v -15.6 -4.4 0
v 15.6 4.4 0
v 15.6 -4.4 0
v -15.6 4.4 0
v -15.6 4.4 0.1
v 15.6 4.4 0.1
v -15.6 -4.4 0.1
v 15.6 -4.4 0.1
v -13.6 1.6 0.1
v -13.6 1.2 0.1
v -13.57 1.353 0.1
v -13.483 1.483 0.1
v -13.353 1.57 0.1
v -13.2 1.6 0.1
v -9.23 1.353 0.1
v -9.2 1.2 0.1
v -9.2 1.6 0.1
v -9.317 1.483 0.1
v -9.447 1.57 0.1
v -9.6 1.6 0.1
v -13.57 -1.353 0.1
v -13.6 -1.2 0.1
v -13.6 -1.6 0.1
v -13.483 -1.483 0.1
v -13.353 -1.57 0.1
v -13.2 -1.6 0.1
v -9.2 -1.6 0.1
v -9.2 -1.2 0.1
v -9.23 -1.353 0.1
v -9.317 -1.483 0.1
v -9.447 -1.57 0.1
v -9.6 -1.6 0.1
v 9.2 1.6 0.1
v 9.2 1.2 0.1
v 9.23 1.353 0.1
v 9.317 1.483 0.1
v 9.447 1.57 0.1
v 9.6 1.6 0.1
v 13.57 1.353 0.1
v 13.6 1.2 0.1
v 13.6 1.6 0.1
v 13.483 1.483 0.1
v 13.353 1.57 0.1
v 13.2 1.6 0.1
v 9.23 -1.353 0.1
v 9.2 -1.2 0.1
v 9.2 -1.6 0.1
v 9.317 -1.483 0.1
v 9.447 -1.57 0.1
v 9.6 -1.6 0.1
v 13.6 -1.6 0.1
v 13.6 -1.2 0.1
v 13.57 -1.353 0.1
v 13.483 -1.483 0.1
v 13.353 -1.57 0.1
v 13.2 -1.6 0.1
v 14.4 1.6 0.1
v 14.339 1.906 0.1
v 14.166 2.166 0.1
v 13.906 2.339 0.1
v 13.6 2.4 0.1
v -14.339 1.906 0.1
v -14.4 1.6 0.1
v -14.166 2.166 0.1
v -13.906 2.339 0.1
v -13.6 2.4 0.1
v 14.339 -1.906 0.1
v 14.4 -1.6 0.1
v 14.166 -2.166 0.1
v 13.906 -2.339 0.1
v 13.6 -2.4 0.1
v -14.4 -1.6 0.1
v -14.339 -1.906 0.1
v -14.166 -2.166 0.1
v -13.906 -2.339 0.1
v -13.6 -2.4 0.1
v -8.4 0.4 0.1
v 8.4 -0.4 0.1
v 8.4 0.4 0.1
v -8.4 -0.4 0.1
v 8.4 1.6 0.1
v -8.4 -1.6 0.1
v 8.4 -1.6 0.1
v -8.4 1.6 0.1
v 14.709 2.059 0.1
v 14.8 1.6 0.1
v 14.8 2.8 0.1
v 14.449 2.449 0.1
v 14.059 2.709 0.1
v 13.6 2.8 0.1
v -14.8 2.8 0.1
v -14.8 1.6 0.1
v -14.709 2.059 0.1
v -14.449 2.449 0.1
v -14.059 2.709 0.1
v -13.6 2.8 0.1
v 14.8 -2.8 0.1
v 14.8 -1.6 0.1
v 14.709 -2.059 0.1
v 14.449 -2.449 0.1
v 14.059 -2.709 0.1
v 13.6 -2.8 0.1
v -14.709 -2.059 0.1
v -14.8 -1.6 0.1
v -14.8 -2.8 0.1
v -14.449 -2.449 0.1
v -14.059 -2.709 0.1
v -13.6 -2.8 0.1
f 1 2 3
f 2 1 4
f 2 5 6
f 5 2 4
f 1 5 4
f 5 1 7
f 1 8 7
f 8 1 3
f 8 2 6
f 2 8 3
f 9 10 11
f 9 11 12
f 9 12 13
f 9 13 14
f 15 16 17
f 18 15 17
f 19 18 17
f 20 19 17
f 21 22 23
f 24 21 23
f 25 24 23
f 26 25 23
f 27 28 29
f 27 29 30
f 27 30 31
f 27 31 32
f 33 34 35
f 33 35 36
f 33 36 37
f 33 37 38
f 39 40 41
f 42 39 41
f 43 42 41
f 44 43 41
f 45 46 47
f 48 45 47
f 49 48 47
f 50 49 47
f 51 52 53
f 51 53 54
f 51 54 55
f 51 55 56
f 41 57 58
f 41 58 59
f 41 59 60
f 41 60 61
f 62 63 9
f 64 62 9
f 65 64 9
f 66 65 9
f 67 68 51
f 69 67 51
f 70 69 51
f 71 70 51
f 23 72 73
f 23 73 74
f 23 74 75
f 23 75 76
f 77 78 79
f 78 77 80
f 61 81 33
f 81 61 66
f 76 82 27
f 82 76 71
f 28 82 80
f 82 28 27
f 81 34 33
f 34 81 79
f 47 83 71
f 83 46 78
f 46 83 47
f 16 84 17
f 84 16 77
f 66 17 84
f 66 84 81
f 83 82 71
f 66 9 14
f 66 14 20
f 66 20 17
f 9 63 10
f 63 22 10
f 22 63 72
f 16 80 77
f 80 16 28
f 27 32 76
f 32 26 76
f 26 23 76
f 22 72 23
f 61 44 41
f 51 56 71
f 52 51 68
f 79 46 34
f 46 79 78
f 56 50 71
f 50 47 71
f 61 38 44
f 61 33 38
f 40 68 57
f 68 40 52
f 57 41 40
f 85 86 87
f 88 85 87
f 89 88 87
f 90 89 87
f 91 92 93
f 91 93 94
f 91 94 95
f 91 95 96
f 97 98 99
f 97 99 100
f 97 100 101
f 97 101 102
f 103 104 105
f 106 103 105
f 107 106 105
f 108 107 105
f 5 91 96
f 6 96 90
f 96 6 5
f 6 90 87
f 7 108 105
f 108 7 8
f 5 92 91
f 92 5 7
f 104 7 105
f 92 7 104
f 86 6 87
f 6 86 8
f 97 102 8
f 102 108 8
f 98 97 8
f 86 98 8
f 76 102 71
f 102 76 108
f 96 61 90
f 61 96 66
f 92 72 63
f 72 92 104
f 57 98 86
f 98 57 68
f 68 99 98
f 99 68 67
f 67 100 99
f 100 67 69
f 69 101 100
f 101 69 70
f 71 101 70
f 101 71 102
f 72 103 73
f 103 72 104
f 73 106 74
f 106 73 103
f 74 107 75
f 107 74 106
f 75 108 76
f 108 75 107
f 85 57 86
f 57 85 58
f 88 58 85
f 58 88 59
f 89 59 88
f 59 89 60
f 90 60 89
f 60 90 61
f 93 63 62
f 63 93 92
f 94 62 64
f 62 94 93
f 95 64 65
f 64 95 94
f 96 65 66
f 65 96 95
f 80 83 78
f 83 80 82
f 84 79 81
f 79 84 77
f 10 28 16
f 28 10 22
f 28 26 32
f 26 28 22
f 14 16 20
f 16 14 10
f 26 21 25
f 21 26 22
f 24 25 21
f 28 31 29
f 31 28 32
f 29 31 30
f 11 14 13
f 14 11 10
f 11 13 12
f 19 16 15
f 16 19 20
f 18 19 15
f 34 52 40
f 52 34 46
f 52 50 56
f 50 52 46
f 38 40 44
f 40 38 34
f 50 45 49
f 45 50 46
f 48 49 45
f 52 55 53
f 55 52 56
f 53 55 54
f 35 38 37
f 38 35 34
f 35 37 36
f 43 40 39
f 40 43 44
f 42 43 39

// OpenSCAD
// file: ../p/1-4ring2.scad
use <../lib.scad>
function ldraw_lib__1_4ring2() = [
// 0 Ring  2 x 0.25
// 0 Name: 1-4ring2.dat
// 0 Author: Franklin W. Cain [fwcain]
// 0 !LDRAW_ORG Primitive UPDATE 2015-01
// 0 !LICENSE Licensed under CC BY 2.0 and CC BY 4.0 : see CAreadme.txt
// 
// 0 BFC CERTIFY CCW
  [0,"BFC","CERTIFY"],
  [0,"BFC","CCW"],
// 
// 0 !HISTORY 2001-12-31 [PTadmin] Official Update 2001-03
// 0 !HISTORY 2007-06-22 [PTadmin] Header formatted for Contributor Agreement
// 0 !HISTORY 2008-07-01 [PTadmin] Official Update 2008-01
// 0 !HISTORY 2012-02-16 [Philo] Changed to CCW
// 0 !HISTORY 2012-03-30 [PTadmin] Official Update 2012-01
// 0 !HISTORY 2014-12-25 [MMR1988] Fixed a rounding issue
// 0 !HISTORY 2015-10-11 [PTadmin] Official Update 2015-01
// 
// 
// 4 16 3 0 0 2.7717 0 1.1481 1.8478 0 0.7654 2 0 0
  [4,16,3,0,0,2.7717,0,1.1481,1.8478,0,0.7654,2,0,0],
// 4 16 2.7717 0 1.1481 2.1213 0 2.1213 1.4142 0 1.4142 1.8478 0 0.7654
  [4,16,2.7717,0,1.1481,2.1213,0,2.1213,1.4142,0,1.4142,1.8478,0,0.7654],
// 4 16 2.1213 0 2.1213 1.1481 0 2.7717 0.7654 0 1.8478 1.4142 0 1.4142
  [4,16,2.1213,0,2.1213,1.1481,0,2.7717,0.7654,0,1.8478,1.4142,0,1.4142],
// 4 16 1.1481 0 2.7717 0 0 3 0 0 2 0.7654 0 1.8478
  [4,16,1.1481,0,2.7717,0,0,3,0,0,2,0.7654,0,1.8478],
// 0 // Build by Primitive Generator 2
];
makepoly(ldraw_lib__1_4ring2(), line=0.2);
// file: ../p/1-4chrd.scad
use <../lib.scad>
function ldraw_lib__1_4chrd() = [
// 0 Chord 0.25
// 0 Name: 1-4chrd.dat
// 0 Author: Tony Hafner [hafhead]
// 0 !LDRAW_ORG Primitive UPDATE 2012-02
// 0 !LICENSE Licensed under CC BY 2.0 and CC BY 4.0 : see CAreadme.txt
// 
// 0 BFC CERTIFY CCW
  [0,"BFC","CERTIFY"],
  [0,"BFC","CCW"],
// 
// 0 !HISTORY 2004-04-22 [PTadmin] Official Update 2004-02
// 0 !HISTORY 2007-10-09 [PTadmin] Header formatted for Contributor Agreement
// 0 !HISTORY 2008-07-01 [PTadmin] Official Update 2008-01
// 0 !HISTORY 2012-08-02 [MMR1988] Re-creation with PrimGen2 and Rectifier
// 0 !HISTORY 2012-08-09 [PTadmin] Official Update 2012-02
// 
// 
// 4 16 0.9239 0 0.3827 0.3827 0 0.9239 0 0 1 1 0 0
  [4,16,0.9239,0,0.3827,0.3827,0,0.9239,0,0,1,1,0,0],
// 3 16 0.7071 0 0.7071 0.3827 0 0.9239 0.9239 0 0.3827
  [3,16,0.7071,0,0.7071,0.3827,0,0.9239,0.9239,0,0.3827],
];
makepoly(ldraw_lib__1_4chrd(), line=0.2);
// file: ../p/1-4ndis.scad
use <../lib.scad>
function ldraw_lib__1_4ndis() = [
// 0 Disc Negative 0.25
// 0 Name: 1-4ndis.dat
// 0 Author: James Jessiman
// 0 !LDRAW_ORG Primitive UPDATE 2012-01
// 0 !LICENSE Licensed under CC BY 2.0 and CC BY 4.0 : see CAreadme.txt
// 
// 0 BFC CERTIFY CCW
  [0,"BFC","CERTIFY"],
  [0,"BFC","CCW"],
// 
// 0 !HISTORY 2002-03-23 [sbliss] Added BFC Statement
// 0 !HISTORY 2002-04-25 [PTadmin] Official Update 2002-02
// 0 !HISTORY 2007-06-22 [PTadmin] Header formatted for Contributor Agreement
// 0 !HISTORY 2008-07-01 [PTadmin] Official Update 2008-01
// 0 !HISTORY 2012-02-16 [Philo] Changed to CCW
// 0 !HISTORY 2012-03-30 [PTadmin] Official Update 2012-01
// 
// 
// 3 16 0.9239 0 0.3827 1 0 0 1 0 1
  [3,16,0.9239,0,0.3827,1,0,0,1,0,1],
// 3 16 0.7071 0 0.7071 0.9239 0 0.3827 1 0 1
  [3,16,0.7071,0,0.7071,0.9239,0,0.3827,1,0,1],
// 3 16 0.3827 0 0.9239 0.7071 0 0.7071 1 0 1
  [3,16,0.3827,0,0.9239,0.7071,0,0.7071,1,0,1],
// 3 16 0 0 1 0.3827 0 0.9239 1 0 1
  [3,16,0,0,1,0.3827,0,0.9239,1,0,1],
];
makepoly(ldraw_lib__1_4ndis(), line=0.2);
// file: ../p/1-4disc.scad
use <../lib.scad>
function ldraw_lib__1_4disc() = [
// 0 Disc 0.25
// 0 Name: 1-4disc.dat
// 0 Author: James Jessiman
// 0 !LDRAW_ORG Primitive UPDATE 2002-02
// 0 !LICENSE Licensed under CC BY 2.0 and CC BY 4.0 : see CAreadme.txt
// 
// 0 BFC CERTIFY CCW
  [0,"BFC","CERTIFY"],
  [0,"BFC","CCW"],
// 
// 0 !HISTORY 2002-03-23 [sbliss] Added BFC statement.
// 0 !HISTORY 2002-04-25 [PTadmin] Official Update 2002-02
// 0 !HISTORY 2007-06-22 [PTadmin] Header formatted for Contributor Agreement
// 0 !HISTORY 2008-07-01 [PTadmin] Official Update 2008-01
// 
// 
// 3 16 0 0 0 1 0 0 0.9239 0 0.3827
  [3,16,0,0,0,1,0,0,0.9239,0,0.3827],
// 3 16 0 0 0 0.9239 0 0.3827 0.7071 0 0.7071
  [3,16,0,0,0,0.9239,0,0.3827,0.7071,0,0.7071],
// 3 16 0 0 0 0.7071 0 0.7071 0.3827 0 0.9239
  [3,16,0,0,0,0.7071,0,0.7071,0.3827,0,0.9239],
// 3 16 0 0 0 0.3827 0 0.9239 0 0 1
  [3,16,0,0,0,0.3827,0,0.9239,0,0,1],
// 0
];
makepoly(ldraw_lib__1_4disc(), line=0.2);
// file: s/3010a20.scad
use <../../lib.scad>
use <../../p/1-4chrd.scad>
use <../../p/1-4ring2.scad>
function ldraw_lib__s__3010a20() = [
// 0 ~Pattern Car Grille for Brick 1 x 4 - Colour
// 0 Name: s\3010a20.dat
// 0 Author: Chris Dee [cwdee]
// 0 !LDRAW_ORG Subpart UPDATE 2013-02
// 0 !LICENSE Licensed under CC BY 2.0 and CC BY 4.0 : see CAreadme.txt
// 
// 0 BFC CERTIFY CCW
  [0,"BFC","CERTIFY"],
  [0,"BFC","CCW"],
// 
// 0 !HISTORY 2002-02-18 [PTadmin] Official Update 2002-01
// 0 !HISTORY 2007-08-29 [PTadmin] Header formatted for Contributor Agreement
// 0 !HISTORY 2008-07-01 [PTadmin] Official Update 2008-01
// 0 !HISTORY 2008-07-07 [DeannaEarley] BFC'd (2005-11-06)
// 0 !HISTORY 2010-07-05 [PTadmin] Official Update 2010-02
// 0 !HISTORY 2013-03-29 [MagFors] Removed emphasis lines, t-junctions
// 0 !HISTORY 2013-04-04 [MMR1988] Saved 4 lines by using chrd instead of disc prims
// 0 !HISTORY 2013-12-23 [PTadmin] Official Update 2013-02
// 
// 
// 0 // Outer line
// 4 16 -34 6 -10 34 6 -10 34 5 -10 -34 5 -10
  [4,16,-34,6,-10,34,6,-10,34,5,-10,-34,5,-10],
// 4 16 -34 19 -10 34 19 -10 34 18 -10 -34 18 -10
  [4,16,-34,19,-10,34,19,-10,34,18,-10,-34,18,-10],
// 4 16 -37 16 -10 -36 16 -10 -36 8 -10 -37 8 -10
  [4,16,-37,16,-10,-36,16,-10,-36,8,-10,-37,8,-10],
// 4 16 37 8 -10 36 8 -10 36 16 -10 37 16 -10
  [4,16,37,8,-10,36,8,-10,36,16,-10,37,16,-10],
// 0 // Outer line corners
// 1 16 34 8 -10 1 0 0 0 0 -1 0 1 0 1-4ring2.dat
  [1,16,34,8,-10,1,0,0,0,0,-1,0,1,0, ldraw_lib__1_4ring2()],
// 1 16 -34 8 -10 -1 0 0 0 0 -1 0 1 0 1-4ring2.dat
  [1,16,-34,8,-10,-1,0,0,0,0,-1,0,1,0, ldraw_lib__1_4ring2()],
// 1 16 34 16 -10 1 0 0 0 0 1 0 1 0 1-4ring2.dat
  [1,16,34,16,-10,1,0,0,0,0,1,0,1,0, ldraw_lib__1_4ring2()],
// 1 16 -34 16 -10 -1 0 0 0 0 1 0 1 0 1-4ring2.dat
  [1,16,-34,16,-10,-1,0,0,0,0,1,0,1,0, ldraw_lib__1_4ring2()],
// 0 // Center grille
// 4 16 -21 11 -10 21 11 -10 21 8 -10 -21 8 -10
  [4,16,-21,11,-10,21,11,-10,21,8,-10,-21,8,-10],
// 4 16 -21 16 -10 21 16 -10 21 13 -10 -21 13 -10
  [4,16,-21,16,-10,21,16,-10,21,13,-10,-21,13,-10],
// 0 // Left light
// 4 16 -34 15 -10 -23 15 -10 -23 9 -10 -34 9 -10
  [4,16,-34,15,-10,-23,15,-10,-23,9,-10,-34,9,-10],
// 4 16 -34 9 -10 -23 9 -10 -24 8 -10 -33 8 -10
  [4,16,-34,9,-10,-23,9,-10,-24,8,-10,-33,8,-10],
// 4 16 -33 16 -10 -24 16 -10 -23 15 -10 -34 15 -10
  [4,16,-33,16,-10,-24,16,-10,-23,15,-10,-34,15,-10],
// 1 16 -33 9 -10 -1 0 0 0 0 -1 0 1 0 1-4chrd.dat
  [1,16,-33,9,-10,-1,0,0,0,0,-1,0,1,0, ldraw_lib__1_4chrd()],
// 1 16 -24 9 -10 1 0 0 0 0 -1 0 1 0 1-4chrd.dat
  [1,16,-24,9,-10,1,0,0,0,0,-1,0,1,0, ldraw_lib__1_4chrd()],
// 1 16 -33 15 -10 -1 0 0 0 0 1 0 1 0 1-4chrd.dat
  [1,16,-33,15,-10,-1,0,0,0,0,1,0,1,0, ldraw_lib__1_4chrd()],
// 1 16 -24 15 -10 1 0 0 0 0 1 0 1 0 1-4chrd.dat
  [1,16,-24,15,-10,1,0,0,0,0,1,0,1,0, ldraw_lib__1_4chrd()],
// 0 // Right light
// 4 16 34 9 -10 23 9 -10 23 15 -10 34 15 -10
  [4,16,34,9,-10,23,9,-10,23,15,-10,34,15,-10],
// 4 16 33 8 -10 24 8 -10 23 9 -10 34 9 -10
  [4,16,33,8,-10,24,8,-10,23,9,-10,34,9,-10],
// 4 16 34 15 -10 23 15 -10 24 16 -10 33 16 -10
  [4,16,34,15,-10,23,15,-10,24,16,-10,33,16,-10],
// 1 16 24 9 -10 -1 0 0 0 0 -1 0 1 0 1-4chrd.dat
  [1,16,24,9,-10,-1,0,0,0,0,-1,0,1,0, ldraw_lib__1_4chrd()],
// 1 16 33 9 -10 1 0 0 0 0 -1 0 1 0 1-4chrd.dat
  [1,16,33,9,-10,1,0,0,0,0,-1,0,1,0, ldraw_lib__1_4chrd()],
// 1 16 24 15 -10 -1 0 0 0 0 1 0 1 0 1-4chrd.dat
  [1,16,24,15,-10,-1,0,0,0,0,1,0,1,0, ldraw_lib__1_4chrd()],
// 1 16 33 15 -10 1 0 0 0 0 1 0 1 0 1-4chrd.dat
  [1,16,33,15,-10,1,0,0,0,0,1,0,1,0, ldraw_lib__1_4chrd()],
];
makepoly(ldraw_lib__s__3010a20(), line=0.2);
// file: s/004711bs02.scad
use <../../lib.scad>
use <../../p/1-4ndis.scad>
function ldraw_lib__s__004711bs02() = [
// 0 ~Pattern Car Grille for Sticker  1.1 x  3.9 - Background
// 0 Name: s\004711bs02.dat
// 0 Author: Takeshi Takahashi [RainbowDolphin]
// 0 !LDRAW_ORG Subpart UPDATE 2023-01
// 0 !LICENSE Licensed under CC BY 2.0 and CC BY 4.0 : see CAreadme.txt
// 
// 0 BFC CERTIFY CCW
  [0,"BFC","CERTIFY"],
  [0,"BFC","CCW"],
// 
// 0 !HISTORY 2023-03-05 [OrionP] Official Update 2023-01
// 
// 
// 0 // Line corners outside
// 1 16 34 -.25 4 3 0 0 0 1 0 0 0 3 1-4ndis.dat
  [1,16,34,-.25,4,3,0,0,0,1,0,0,0,3, ldraw_lib__1_4ndis()],
// 1 16 -34 -.25 4 -3 0 0 0 1 0 0 0 3 1-4ndis.dat
  [1,16,-34,-.25,4,-3,0,0,0,1,0,0,0,3, ldraw_lib__1_4ndis()],
// 1 16 34 -.25 -4 3 0 0 0 1 0 0 0 -3 1-4ndis.dat
  [1,16,34,-.25,-4,3,0,0,0,1,0,0,0,-3, ldraw_lib__1_4ndis()],
// 1 16 -34 -.25 -4 -3 0 0 0 1 0 0 0 -3 1-4ndis.dat
  [1,16,-34,-.25,-4,-3,0,0,0,1,0,0,0,-3, ldraw_lib__1_4ndis()],
// 0 // Outside
// 3 16 -39 -.25 11 -37 -.25 7 -34 -.25 7
  [3,16,-39,-.25,11,-37,-.25,7,-34,-.25,7],
// 4 16 -39 -.25 11 -34 -.25 7 34 -.25 7 39 -.25 11
  [4,16,-39,-.25,11,-34,-.25,7,34,-.25,7,39,-.25,11],
// 3 16 39 -.25 11 34 -.25 7 37 -.25 7
  [3,16,39,-.25,11,34,-.25,7,37,-.25,7],
// 4 16 -34 -.25 -7 -37 -.25 -7 -39 -.25 -11 39 -.25 -11
  [4,16,-34,-.25,-7,-37,-.25,-7,-39,-.25,-11,39,-.25,-11],
// 4 16 -37 -.25 4 -37 -.25 7 -39 -.25 11 -39 -.25 -11
  [4,16,-37,-.25,4,-37,-.25,7,-39,-.25,11,-39,-.25,-11],
// 3 16 -37 -.25 -4 -39 -.25 -11 -37 -.25 -7
  [3,16,-37,-.25,-4,-39,-.25,-11,-37,-.25,-7],
// 3 16 -37 -.25 4 -39 -.25 -11 -37 -.25 -4
  [3,16,-37,-.25,4,-39,-.25,-11,-37,-.25,-4],
// 4 16 39 -.25 11 37 -.25 7 37 -.25 4 39 -.25 -11
  [4,16,39,-.25,11,37,-.25,7,37,-.25,4,39,-.25,-11],
// 3 16 37 -.25 -7 34 -.25 -7 39 -.25 -11
  [3,16,37,-.25,-7,34,-.25,-7,39,-.25,-11],
// 3 16 34 -.25 -7 -34 -.25 -7 39 -.25 -11
  [3,16,34,-.25,-7,-34,-.25,-7,39,-.25,-11],
// 3 16 37 -.25 -4 37 -.25 -7 39 -.25 -11
  [3,16,37,-.25,-4,37,-.25,-7,39,-.25,-11],
// 3 16 37 -.25 4 37 -.25 -4 39 -.25 -11
  [3,16,37,-.25,4,37,-.25,-4,39,-.25,-11],
];
makepoly(ldraw_lib__s__004711bs02(), line=0.2);
// file: s/004711bs01.scad
use <../../lib.scad>
use <../../p/1-4disc.scad>
use <../../p/1-4ndis.scad>
function ldraw_lib__s__004711bs01() = [
// 0 ~Pattern Car Grille for Sticker  1.1 x  3.9 - Mask
// 0 Name: s\004711bs01.dat
// 0 Author: Takeshi Takahashi [RainbowDolphin]
// 0 !LDRAW_ORG Subpart UPDATE 2023-01
// 0 !LICENSE Licensed under CC BY 2.0 and CC BY 4.0 : see CAreadme.txt
// 
// 0 BFC CERTIFY CCW
  [0,"BFC","CERTIFY"],
  [0,"BFC","CCW"],
// 
// 0 !HISTORY 2020-11-08 [RainbowDolphin] Created based on s\3010b20 by Chris Dee [cwdee]
// 0 !HISTORY 2023-03-05 [OrionP] Official Update 2023-01
// 
// 
// 0 // Left light corners
// 
// 1 16 -33 -.25 3 -1 0 0 0 1 0 0 0 1 1-4ndis.dat
  [1,16,-33,-.25,3,-1,0,0,0,1,0,0,0,1, ldraw_lib__1_4ndis()],
// 1 16 -24 -.25 3 1 0 0 0 1 0 0 0 1 1-4ndis.dat
  [1,16,-24,-.25,3,1,0,0,0,1,0,0,0,1, ldraw_lib__1_4ndis()],
// 1 16 -33 -.25 -3 -1 0 0 0 1 0 0 0 -1 1-4ndis.dat
  [1,16,-33,-.25,-3,-1,0,0,0,1,0,0,0,-1, ldraw_lib__1_4ndis()],
// 1 16 -24 -.25 -3 1 0 0 0 1 0 0 0 -1 1-4ndis.dat
  [1,16,-24,-.25,-3,1,0,0,0,1,0,0,0,-1, ldraw_lib__1_4ndis()],
// 0 // Right light corners
// 1 16 24 -.25 3 -1 0 0 0 1 0 0 0 1 1-4ndis.dat
  [1,16,24,-.25,3,-1,0,0,0,1,0,0,0,1, ldraw_lib__1_4ndis()],
// 1 16 33 -.25 3 1 0 0 0 1 0 0 0 1 1-4ndis.dat
  [1,16,33,-.25,3,1,0,0,0,1,0,0,0,1, ldraw_lib__1_4ndis()],
// 1 16 24 -.25 -3 -1 0 0 0 1 0 0 0 -1 1-4ndis.dat
  [1,16,24,-.25,-3,-1,0,0,0,1,0,0,0,-1, ldraw_lib__1_4ndis()],
// 1 16 33 -.25 -3 1 0 0 0 1 0 0 0 -1 1-4ndis.dat
  [1,16,33,-.25,-3,1,0,0,0,1,0,0,0,-1, ldraw_lib__1_4ndis()],
// 0 // Line corners inside
// 1 16 34 -.25 4 2 0 0 0 1 0 0 0 2 1-4disc.dat
  [1,16,34,-.25,4,2,0,0,0,1,0,0,0,2, ldraw_lib__1_4disc()],
// 1 16 -34 -.25 4 -2 0 0 0 1 0 0 0 2 1-4disc.dat
  [1,16,-34,-.25,4,-2,0,0,0,1,0,0,0,2, ldraw_lib__1_4disc()],
// 1 16 34 -.25 -4 2 0 0 0 1 0 0 0 -2 1-4disc.dat
  [1,16,34,-.25,-4,2,0,0,0,1,0,0,0,-2, ldraw_lib__1_4disc()],
// 1 16 -34 -.25 -4 -2 0 0 0 1 0 0 0 -2 1-4disc.dat
  [1,16,-34,-.25,-4,-2,0,0,0,1,0,0,0,-2, ldraw_lib__1_4disc()],
// 0 // Inside
// 4 16 -21 -.25 -1 21 -.25 -1 21 -.25 1 -21 -.25 1
  [4,16,-21,-.25,-1,21,-.25,-1,21,-.25,1,-21,-.25,1],
// 4 16 21 -.25 4 23 -.25 4 34 -.25 6 -34 -.25 6
  [4,16,21,-.25,4,23,-.25,4,34,-.25,6,-34,-.25,6],
// 4 16 -21 -.25 -4 -23 -.25 -4 -34 -.25 -6 34 -.25 -6
  [4,16,-21,-.25,-4,-23,-.25,-4,-34,-.25,-6,34,-.25,-6],
// 4 16 -23 -.25 -4 -21 -.25 -4 -21 -.25 -1 -23 -.25 -3
  [4,16,-23,-.25,-4,-21,-.25,-4,-21,-.25,-1,-23,-.25,-3],
// 4 16 23 -.25 4 21 -.25 4 21 -.25 1 23 -.25 3
  [4,16,23,-.25,4,21,-.25,4,21,-.25,1,23,-.25,3],
// 3 16 23 -.25 -4 21 -.25 -4 34 -.25 -6
  [3,16,23,-.25,-4,21,-.25,-4,34,-.25,-6],
// 4 16 21 -.25 -1 21 -.25 -4 23 -.25 -4 23 -.25 -3
  [4,16,21,-.25,-1,21,-.25,-4,23,-.25,-4,23,-.25,-3],
// 4 16 -21 -.25 1 -21 -.25 4 -23 -.25 4 -23 -.25 3
  [4,16,-21,-.25,1,-21,-.25,4,-23,-.25,4,-23,-.25,3],
// 3 16 -34 -.25 6 -23 -.25 4 -21 -.25 4
  [3,16,-34,-.25,6,-23,-.25,4,-21,-.25,4],
// 3 16 -34 -.25 6 -21 -.25 4 21 -.25 4
  [3,16,-34,-.25,6,-21,-.25,4,21,-.25,4],
// 3 16 21 -.25 -4 -21 -.25 -4 34 -.25 -6
  [3,16,21,-.25,-4,-21,-.25,-4,34,-.25,-6],
// 3 16 -34 -.25 6 -34 -.25 4 -33 -.25 4
  [3,16,-34,-.25,6,-34,-.25,4,-33,-.25,4],
// 3 16 -34 -.25 6 -33 -.25 4 -24 -.25 4
  [3,16,-34,-.25,6,-33,-.25,4,-24,-.25,4],
// 3 16 -34 -.25 6 -24 -.25 4 -23 -.25 4
  [3,16,-34,-.25,6,-24,-.25,4,-23,-.25,4],
// 3 16 -34 -.25 4 -36 -.25 4 -34 -.25 3
  [3,16,-34,-.25,4,-36,-.25,4,-34,-.25,3],
// 4 16 -34 -.25 -3 -34 -.25 3 -36 -.25 4 -36 -.25 -4
  [4,16,-34,-.25,-3,-34,-.25,3,-36,-.25,4,-36,-.25,-4],
// 4 16 -23 -.25 3 -23 -.25 -3 -21 -.25 -1 -21 -.25 1
  [4,16,-23,-.25,3,-23,-.25,-3,-21,-.25,-1,-21,-.25,1],
// 3 16 -23 -.25 -4 -24 -.25 -4 -34 -.25 -6
  [3,16,-23,-.25,-4,-24,-.25,-4,-34,-.25,-6],
// 3 16 -24 -.25 -4 -33 -.25 -4 -34 -.25 -6
  [3,16,-24,-.25,-4,-33,-.25,-4,-34,-.25,-6],
// 3 16 -33 -.25 -4 -34 -.25 -4 -34 -.25 -6
  [3,16,-33,-.25,-4,-34,-.25,-4,-34,-.25,-6],
// 3 16 -34 -.25 -3 -36 -.25 -4 -34 -.25 -4
  [3,16,-34,-.25,-3,-36,-.25,-4,-34,-.25,-4],
// 3 16 34 -.25 6 33 -.25 4 34 -.25 4
  [3,16,34,-.25,6,33,-.25,4,34,-.25,4],
// 3 16 34 -.25 -4 33 -.25 -4 34 -.25 -6
  [3,16,34,-.25,-4,33,-.25,-4,34,-.25,-6],
// 3 16 34 -.25 -3 34 -.25 -4 36 -.25 -4
  [3,16,34,-.25,-3,34,-.25,-4,36,-.25,-4],
// 4 16 23 -.25 -3 23 -.25 3 21 -.25 1 21 -.25 -1
  [4,16,23,-.25,-3,23,-.25,3,21,-.25,1,21,-.25,-1],
// 3 16 33 -.25 -4 24 -.25 -4 34 -.25 -6
  [3,16,33,-.25,-4,24,-.25,-4,34,-.25,-6],
// 3 16 24 -.25 -4 23 -.25 -4 34 -.25 -6
  [3,16,24,-.25,-4,23,-.25,-4,34,-.25,-6],
// 3 16 34 -.25 6 24 -.25 4 33 -.25 4
  [3,16,34,-.25,6,24,-.25,4,33,-.25,4],
// 3 16 34 -.25 6 23 -.25 4 24 -.25 4
  [3,16,34,-.25,6,23,-.25,4,24,-.25,4],
// 4 16 34 -.25 3 34 -.25 -3 36 -.25 -4 36 -.25 4
  [4,16,34,-.25,3,34,-.25,-3,36,-.25,-4,36,-.25,4],
// 3 16 36 -.25 4 34 -.25 4 34 -.25 3
  [3,16,36,-.25,4,34,-.25,4,34,-.25,3],
];
makepoly(ldraw_lib__s__004711bs01(), line=0.2);
// file: ../p/box5-12.scad
use <../lib.scad>
function ldraw_lib__box5_12() = [
// 0 Box with 5 Faces without Any Edges
// 0 Name: box5-12.dat
// 0 Author: Chris Dee [cwdee]
// 0 !LDRAW_ORG Primitive UPDATE 2009-02
// 0 !LICENSE Licensed under CC BY 2.0 and CC BY 4.0 : see CAreadme.txt
// 
// 0 BFC CERTIFY CCW
  [0,"BFC","CERTIFY"],
  [0,"BFC","CCW"],
// 
// 0 !HISTORY 2009-09-03 [PTadmin] Official Update 2009-02
// 
// 
// 4 16 1 1 1 1 1 -1 -1 1 -1 -1 1 1
  [4,16,1,1,1,1,1,-1,-1,1,-1,-1,1,1],
// 4 16 -1 0 1 1 0 1 1 1 1 -1 1 1
  [4,16,-1,0,1,1,0,1,1,1,1,-1,1,1],
// 4 16 -1 0 -1 -1 0 1 -1 1 1 -1 1 -1
  [4,16,-1,0,-1,-1,0,1,-1,1,1,-1,1,-1],
// 4 16 1 0 -1 -1 0 -1 -1 1 -1 1 1 -1
  [4,16,1,0,-1,-1,0,-1,-1,1,-1,1,1,-1],
// 4 16 1 0 1 1 0 -1 1 1 -1 1 1 1
  [4,16,1,0,1,1,0,-1,1,1,-1,1,1,1],
// 0
];
makepoly(ldraw_lib__box5_12(), line=0.2);
// main file
use <../lib.scad>
use <../p/box5-12.scad>
use <s/004711bs01.scad>
use <s/004711bs02.scad>
use <s/3010a20.scad>
function ldraw_lib__004711b() = [
// 0 Sticker  1.1 x  3.9 with Black Town Car Grille on White Background
// 0 Name: 004711b.dat
// 0 Author: Takeshi Takahashi [RainbowDolphin]
// 0 !LDRAW_ORG Part UPDATE 2023-01
// 0 !LICENSE Licensed under CC BY 2.0 and CC BY 4.0 : see CAreadme.txt
// 
// 0 BFC CERTIFY CCW
  [0,"BFC","CERTIFY"],
  [0,"BFC","CCW"],
// 
// 0 !KEYWORDS Police car, set 621-1
// 
// 0 !HISTORY 2023-03-05 [OrionP] Official Update 2023-01
// 
// 
// 1 16 0 -0.25 0 39 0 0 0 0.25 0 0 0 11 box5-12.dat
  [1,16,0,-0.25,0,39,0,0,0,0.25,0,0,0,11, ldraw_lib__box5_12()],
// 1 15 0 0 0 1 0 0 0 1 0 0 0 1 s\004711bs01.dat
  [1,15,0,0,0,1,0,0,0,1,0,0,0,1, ldraw_lib__s__004711bs01()],
// 1 15 0 0 0 1 0 0 0 1 0 0 0 1 s\004711bs02.dat
  [1,15,0,0,0,1,0,0,0,1,0,0,0,1, ldraw_lib__s__004711bs02()],
// 1 0 0 9.75 -12 1 0 0 0 0 1 0 1 0 s\3010a20.dat
  [1,0,0,9.75,-12,1,0,0,0,0,1,0,1,0, ldraw_lib__s__3010a20()],
];
makepoly(ldraw_lib__004711b(), line=0.2);
